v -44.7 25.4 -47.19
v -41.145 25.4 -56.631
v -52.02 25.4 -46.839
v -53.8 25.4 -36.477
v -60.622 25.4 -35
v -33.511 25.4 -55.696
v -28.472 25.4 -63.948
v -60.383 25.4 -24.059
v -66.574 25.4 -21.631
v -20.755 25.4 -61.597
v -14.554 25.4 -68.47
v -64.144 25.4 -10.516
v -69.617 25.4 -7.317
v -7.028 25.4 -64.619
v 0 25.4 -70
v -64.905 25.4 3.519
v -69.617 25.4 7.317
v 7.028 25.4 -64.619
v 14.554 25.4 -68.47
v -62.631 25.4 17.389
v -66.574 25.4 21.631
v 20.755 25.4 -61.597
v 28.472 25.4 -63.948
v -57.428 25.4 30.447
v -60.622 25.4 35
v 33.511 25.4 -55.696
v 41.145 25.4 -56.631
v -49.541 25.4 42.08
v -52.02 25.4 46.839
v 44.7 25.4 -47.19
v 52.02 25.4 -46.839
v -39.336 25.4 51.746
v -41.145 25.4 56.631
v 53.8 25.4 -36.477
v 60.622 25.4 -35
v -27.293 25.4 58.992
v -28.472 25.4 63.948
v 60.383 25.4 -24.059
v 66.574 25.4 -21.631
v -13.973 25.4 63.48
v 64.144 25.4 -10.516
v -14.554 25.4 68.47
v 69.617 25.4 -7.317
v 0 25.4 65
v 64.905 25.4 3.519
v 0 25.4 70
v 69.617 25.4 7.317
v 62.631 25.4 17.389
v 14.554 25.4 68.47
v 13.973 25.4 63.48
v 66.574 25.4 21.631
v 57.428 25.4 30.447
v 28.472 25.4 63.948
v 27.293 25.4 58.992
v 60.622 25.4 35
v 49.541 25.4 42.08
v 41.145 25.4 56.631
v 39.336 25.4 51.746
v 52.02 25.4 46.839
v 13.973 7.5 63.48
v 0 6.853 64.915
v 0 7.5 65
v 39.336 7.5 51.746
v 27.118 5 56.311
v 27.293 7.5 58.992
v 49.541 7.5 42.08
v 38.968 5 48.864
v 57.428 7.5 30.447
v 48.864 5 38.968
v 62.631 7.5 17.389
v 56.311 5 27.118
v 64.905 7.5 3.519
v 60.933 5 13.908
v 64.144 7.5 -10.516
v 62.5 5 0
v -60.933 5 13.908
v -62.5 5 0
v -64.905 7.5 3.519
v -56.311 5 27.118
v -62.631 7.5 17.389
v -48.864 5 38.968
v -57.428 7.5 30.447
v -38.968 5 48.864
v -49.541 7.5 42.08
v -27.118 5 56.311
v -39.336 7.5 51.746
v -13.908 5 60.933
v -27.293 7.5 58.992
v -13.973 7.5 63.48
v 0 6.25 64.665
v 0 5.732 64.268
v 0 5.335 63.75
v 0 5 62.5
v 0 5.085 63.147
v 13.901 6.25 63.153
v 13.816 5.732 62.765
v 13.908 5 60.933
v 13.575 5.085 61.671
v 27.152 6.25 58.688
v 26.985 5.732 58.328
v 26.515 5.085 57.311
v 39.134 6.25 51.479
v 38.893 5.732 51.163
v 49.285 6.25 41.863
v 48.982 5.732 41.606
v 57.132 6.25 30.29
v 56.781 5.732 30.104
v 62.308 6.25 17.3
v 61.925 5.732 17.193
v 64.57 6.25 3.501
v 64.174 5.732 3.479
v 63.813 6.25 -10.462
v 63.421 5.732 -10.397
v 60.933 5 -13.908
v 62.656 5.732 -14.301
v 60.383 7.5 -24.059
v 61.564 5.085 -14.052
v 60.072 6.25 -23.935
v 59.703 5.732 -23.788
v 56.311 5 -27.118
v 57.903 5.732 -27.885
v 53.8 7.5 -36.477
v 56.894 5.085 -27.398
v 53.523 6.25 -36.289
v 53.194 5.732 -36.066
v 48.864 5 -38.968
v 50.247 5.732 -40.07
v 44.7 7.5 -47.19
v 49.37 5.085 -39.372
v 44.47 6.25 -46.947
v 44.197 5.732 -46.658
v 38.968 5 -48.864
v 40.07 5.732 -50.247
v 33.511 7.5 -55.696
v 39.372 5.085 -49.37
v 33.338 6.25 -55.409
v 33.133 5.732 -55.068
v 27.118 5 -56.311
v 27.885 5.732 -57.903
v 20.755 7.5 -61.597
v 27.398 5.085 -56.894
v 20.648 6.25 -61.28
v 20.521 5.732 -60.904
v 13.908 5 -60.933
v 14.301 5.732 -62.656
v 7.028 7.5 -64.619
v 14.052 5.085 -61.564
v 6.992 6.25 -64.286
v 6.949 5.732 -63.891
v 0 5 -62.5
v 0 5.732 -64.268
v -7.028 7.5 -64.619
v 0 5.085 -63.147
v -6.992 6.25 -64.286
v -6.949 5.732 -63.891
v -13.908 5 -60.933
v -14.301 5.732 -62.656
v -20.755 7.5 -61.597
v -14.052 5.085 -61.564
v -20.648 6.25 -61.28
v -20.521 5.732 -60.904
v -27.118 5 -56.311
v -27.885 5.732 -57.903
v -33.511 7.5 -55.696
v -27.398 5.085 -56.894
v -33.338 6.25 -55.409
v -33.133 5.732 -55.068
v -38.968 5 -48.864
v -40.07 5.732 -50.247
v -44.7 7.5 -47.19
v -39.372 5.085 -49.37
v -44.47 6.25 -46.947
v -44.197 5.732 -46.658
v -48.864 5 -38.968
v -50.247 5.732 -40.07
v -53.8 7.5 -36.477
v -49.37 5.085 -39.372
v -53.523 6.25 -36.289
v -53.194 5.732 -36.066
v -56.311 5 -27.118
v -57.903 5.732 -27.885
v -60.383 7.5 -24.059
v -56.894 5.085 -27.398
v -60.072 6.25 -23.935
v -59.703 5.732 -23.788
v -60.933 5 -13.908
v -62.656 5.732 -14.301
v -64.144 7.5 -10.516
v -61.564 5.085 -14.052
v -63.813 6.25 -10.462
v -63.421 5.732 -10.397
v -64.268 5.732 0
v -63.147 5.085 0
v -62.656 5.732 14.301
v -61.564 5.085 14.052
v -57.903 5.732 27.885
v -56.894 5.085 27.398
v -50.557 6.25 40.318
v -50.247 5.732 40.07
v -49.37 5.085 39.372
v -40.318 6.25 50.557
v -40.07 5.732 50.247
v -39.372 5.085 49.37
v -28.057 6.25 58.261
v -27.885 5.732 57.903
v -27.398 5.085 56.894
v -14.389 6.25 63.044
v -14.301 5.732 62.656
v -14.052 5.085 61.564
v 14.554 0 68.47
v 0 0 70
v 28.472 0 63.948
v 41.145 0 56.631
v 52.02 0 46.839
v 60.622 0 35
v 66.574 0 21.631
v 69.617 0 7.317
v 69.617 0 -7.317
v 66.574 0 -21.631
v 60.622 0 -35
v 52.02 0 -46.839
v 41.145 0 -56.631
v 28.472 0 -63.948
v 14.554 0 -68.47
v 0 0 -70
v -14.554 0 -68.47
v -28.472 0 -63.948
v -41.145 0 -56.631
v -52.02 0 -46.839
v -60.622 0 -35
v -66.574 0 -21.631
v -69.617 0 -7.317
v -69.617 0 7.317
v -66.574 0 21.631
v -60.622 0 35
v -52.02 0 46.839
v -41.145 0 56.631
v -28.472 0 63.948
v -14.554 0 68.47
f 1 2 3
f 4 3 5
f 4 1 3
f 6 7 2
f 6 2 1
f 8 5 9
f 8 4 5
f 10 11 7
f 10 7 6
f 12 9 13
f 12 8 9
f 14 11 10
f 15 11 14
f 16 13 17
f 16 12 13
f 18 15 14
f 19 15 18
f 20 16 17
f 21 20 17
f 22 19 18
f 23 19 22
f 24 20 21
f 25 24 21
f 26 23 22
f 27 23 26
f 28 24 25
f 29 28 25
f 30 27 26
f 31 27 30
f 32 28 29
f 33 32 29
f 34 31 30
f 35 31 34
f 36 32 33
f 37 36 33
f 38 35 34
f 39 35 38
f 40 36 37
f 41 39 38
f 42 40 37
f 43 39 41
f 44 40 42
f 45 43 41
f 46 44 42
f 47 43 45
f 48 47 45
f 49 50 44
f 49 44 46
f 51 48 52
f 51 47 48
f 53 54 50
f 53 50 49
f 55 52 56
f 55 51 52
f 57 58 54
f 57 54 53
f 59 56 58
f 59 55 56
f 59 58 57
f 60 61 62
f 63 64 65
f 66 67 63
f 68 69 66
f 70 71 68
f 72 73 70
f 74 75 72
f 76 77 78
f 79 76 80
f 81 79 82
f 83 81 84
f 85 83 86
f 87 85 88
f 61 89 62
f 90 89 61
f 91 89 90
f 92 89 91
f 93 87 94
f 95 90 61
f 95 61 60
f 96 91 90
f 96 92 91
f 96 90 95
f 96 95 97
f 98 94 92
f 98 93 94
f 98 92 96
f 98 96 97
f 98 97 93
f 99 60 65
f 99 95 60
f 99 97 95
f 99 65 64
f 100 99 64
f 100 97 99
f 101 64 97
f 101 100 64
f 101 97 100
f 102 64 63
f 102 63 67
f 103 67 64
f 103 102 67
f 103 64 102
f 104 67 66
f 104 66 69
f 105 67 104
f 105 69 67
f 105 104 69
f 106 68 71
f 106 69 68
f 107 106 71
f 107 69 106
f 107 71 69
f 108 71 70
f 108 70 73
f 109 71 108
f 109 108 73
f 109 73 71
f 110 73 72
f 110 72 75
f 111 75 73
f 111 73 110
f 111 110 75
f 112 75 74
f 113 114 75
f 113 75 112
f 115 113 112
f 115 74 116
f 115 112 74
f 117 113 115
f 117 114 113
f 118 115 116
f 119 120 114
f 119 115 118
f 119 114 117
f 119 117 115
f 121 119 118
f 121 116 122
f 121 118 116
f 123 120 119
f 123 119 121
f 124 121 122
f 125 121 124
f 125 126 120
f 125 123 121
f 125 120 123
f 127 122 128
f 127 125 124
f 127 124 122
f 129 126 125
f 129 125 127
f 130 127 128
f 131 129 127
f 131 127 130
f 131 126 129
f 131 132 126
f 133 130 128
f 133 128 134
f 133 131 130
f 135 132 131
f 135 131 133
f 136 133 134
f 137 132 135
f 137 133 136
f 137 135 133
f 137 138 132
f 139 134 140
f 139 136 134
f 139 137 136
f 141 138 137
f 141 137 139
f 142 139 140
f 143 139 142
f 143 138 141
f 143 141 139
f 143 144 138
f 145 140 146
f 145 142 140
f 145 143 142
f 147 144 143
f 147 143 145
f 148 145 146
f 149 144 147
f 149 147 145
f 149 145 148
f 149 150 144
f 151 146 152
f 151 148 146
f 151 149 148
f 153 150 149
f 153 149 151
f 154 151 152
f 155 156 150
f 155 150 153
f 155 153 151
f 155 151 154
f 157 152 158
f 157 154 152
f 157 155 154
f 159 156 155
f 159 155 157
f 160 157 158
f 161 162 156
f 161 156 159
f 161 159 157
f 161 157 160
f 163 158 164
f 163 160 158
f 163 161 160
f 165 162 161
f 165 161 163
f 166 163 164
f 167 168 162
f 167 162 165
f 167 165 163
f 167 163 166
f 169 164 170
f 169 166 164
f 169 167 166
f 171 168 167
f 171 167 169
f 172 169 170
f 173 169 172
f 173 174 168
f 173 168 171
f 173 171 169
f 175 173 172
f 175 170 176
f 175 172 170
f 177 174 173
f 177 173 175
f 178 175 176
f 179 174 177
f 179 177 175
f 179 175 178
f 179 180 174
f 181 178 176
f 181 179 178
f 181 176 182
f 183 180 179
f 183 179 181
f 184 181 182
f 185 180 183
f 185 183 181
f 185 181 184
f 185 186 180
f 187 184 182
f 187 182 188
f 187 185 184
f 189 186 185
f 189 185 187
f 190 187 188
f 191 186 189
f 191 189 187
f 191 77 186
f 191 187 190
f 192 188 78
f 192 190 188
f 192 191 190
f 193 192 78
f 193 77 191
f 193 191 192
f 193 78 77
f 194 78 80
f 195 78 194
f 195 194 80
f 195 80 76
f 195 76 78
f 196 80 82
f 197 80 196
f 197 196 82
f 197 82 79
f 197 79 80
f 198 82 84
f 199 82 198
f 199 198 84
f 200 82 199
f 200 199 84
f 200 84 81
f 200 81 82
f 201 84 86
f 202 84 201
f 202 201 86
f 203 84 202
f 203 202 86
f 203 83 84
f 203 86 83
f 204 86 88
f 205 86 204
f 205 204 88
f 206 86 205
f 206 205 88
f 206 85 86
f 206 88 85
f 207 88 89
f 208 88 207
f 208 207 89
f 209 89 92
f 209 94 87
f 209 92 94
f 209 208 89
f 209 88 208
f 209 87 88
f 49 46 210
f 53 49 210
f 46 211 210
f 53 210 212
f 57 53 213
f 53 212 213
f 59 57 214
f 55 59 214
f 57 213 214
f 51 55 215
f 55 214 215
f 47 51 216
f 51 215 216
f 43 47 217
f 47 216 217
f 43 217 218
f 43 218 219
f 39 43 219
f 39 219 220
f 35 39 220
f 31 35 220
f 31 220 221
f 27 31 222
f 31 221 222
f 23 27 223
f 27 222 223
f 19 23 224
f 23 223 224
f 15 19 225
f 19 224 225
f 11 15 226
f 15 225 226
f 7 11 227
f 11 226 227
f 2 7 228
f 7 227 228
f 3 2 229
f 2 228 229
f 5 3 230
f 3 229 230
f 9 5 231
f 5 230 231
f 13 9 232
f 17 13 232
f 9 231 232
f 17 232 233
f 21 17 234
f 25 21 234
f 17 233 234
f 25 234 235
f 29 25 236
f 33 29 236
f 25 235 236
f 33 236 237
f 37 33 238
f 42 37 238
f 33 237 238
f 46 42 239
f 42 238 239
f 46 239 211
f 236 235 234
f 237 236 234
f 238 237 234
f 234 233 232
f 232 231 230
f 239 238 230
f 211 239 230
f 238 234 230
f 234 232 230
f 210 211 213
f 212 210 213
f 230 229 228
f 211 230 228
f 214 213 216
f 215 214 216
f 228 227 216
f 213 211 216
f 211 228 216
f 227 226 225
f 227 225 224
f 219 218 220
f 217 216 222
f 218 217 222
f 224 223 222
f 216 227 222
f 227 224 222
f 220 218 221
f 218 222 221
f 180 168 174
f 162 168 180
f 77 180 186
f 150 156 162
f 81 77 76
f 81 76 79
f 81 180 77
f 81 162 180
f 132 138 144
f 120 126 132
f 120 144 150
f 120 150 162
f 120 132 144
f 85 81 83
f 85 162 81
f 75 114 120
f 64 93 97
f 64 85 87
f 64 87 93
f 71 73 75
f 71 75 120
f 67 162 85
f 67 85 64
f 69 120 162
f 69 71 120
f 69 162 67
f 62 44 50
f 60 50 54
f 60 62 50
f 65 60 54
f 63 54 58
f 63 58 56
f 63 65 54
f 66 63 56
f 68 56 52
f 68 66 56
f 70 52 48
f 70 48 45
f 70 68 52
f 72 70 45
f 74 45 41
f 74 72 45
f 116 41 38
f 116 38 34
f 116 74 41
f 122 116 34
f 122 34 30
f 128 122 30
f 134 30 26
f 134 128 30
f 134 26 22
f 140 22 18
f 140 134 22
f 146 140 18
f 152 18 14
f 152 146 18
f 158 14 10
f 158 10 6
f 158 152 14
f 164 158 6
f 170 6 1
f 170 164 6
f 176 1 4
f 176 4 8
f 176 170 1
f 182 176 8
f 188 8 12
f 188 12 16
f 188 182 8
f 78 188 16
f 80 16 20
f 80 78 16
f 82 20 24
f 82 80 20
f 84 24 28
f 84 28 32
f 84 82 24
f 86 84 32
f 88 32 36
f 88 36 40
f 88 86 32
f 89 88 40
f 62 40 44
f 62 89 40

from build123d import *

# Parameters (mm, degrees)
SKETCH1_R           = 70
SKETCH1_R_2         = 65
SKETCH1_R_3         = 55
BOSS_EXTRUDE1_DEPTH = 5
SKETCH2_R           = 70
SKETCH2_R_2         = 65
BOSS_EXTRUDE2_DEPTH = 20.4
FILLET1_R           = 2.5


with BuildPart() as part:
    # Sketch1 → Boss-Extrude1 (new body)
    # profile 1 of 3: a face of its own
    with BuildSketch(Plane(origin=(0, 0, 0), x_dir=(1, 0, 0), z_dir=(0, 1, 0))):
        with Locations(Location((0, 0, 0), (0, 0, 270))):
            Circle(SKETCH1_R)
        Circle(SKETCH1_R_2, mode=Mode.SUBTRACT)
    # profile 2 of 3: a face of its own
    with BuildSketch(Plane(origin=(0, 0, 0), x_dir=(1, 0, 0), z_dir=(0, 1, 0))):
        Circle(SKETCH1_R_2)
        Circle(SKETCH1_R_3, mode=Mode.SUBTRACT)
    # profile 3 of 3: a face of its own
    with BuildSketch(Plane(origin=(0, 0, 0), x_dir=(1, 0, 0), z_dir=(0, 1, 0))):
        Circle(SKETCH1_R_3)
    extrude(amount=BOSS_EXTRUDE1_DEPTH)

    # Sketch2 → Boss-Extrude2 (add)
    with BuildSketch(Plane(origin=(0, 5, 0), x_dir=(1, 0, 0), z_dir=(0, 1, 0))):
        with Locations(Location((0, 0, 0), (0, 0, 270))):
            Circle(SKETCH2_R)
        with Locations(Location((0, 0, 0), (0, 0, 270))):
            Circle(SKETCH2_R_2, mode=Mode.SUBTRACT)
    extrude(amount=BOSS_EXTRUDE2_DEPTH)

    # Fillet1
    fillet1_edges = [part.edges().sort_by_distance(p)[0] for p in [
        (0, 5, -65),
    ]]
    fillet(fillet1_edges, radius=FILLET1_R)


solid = part.part
